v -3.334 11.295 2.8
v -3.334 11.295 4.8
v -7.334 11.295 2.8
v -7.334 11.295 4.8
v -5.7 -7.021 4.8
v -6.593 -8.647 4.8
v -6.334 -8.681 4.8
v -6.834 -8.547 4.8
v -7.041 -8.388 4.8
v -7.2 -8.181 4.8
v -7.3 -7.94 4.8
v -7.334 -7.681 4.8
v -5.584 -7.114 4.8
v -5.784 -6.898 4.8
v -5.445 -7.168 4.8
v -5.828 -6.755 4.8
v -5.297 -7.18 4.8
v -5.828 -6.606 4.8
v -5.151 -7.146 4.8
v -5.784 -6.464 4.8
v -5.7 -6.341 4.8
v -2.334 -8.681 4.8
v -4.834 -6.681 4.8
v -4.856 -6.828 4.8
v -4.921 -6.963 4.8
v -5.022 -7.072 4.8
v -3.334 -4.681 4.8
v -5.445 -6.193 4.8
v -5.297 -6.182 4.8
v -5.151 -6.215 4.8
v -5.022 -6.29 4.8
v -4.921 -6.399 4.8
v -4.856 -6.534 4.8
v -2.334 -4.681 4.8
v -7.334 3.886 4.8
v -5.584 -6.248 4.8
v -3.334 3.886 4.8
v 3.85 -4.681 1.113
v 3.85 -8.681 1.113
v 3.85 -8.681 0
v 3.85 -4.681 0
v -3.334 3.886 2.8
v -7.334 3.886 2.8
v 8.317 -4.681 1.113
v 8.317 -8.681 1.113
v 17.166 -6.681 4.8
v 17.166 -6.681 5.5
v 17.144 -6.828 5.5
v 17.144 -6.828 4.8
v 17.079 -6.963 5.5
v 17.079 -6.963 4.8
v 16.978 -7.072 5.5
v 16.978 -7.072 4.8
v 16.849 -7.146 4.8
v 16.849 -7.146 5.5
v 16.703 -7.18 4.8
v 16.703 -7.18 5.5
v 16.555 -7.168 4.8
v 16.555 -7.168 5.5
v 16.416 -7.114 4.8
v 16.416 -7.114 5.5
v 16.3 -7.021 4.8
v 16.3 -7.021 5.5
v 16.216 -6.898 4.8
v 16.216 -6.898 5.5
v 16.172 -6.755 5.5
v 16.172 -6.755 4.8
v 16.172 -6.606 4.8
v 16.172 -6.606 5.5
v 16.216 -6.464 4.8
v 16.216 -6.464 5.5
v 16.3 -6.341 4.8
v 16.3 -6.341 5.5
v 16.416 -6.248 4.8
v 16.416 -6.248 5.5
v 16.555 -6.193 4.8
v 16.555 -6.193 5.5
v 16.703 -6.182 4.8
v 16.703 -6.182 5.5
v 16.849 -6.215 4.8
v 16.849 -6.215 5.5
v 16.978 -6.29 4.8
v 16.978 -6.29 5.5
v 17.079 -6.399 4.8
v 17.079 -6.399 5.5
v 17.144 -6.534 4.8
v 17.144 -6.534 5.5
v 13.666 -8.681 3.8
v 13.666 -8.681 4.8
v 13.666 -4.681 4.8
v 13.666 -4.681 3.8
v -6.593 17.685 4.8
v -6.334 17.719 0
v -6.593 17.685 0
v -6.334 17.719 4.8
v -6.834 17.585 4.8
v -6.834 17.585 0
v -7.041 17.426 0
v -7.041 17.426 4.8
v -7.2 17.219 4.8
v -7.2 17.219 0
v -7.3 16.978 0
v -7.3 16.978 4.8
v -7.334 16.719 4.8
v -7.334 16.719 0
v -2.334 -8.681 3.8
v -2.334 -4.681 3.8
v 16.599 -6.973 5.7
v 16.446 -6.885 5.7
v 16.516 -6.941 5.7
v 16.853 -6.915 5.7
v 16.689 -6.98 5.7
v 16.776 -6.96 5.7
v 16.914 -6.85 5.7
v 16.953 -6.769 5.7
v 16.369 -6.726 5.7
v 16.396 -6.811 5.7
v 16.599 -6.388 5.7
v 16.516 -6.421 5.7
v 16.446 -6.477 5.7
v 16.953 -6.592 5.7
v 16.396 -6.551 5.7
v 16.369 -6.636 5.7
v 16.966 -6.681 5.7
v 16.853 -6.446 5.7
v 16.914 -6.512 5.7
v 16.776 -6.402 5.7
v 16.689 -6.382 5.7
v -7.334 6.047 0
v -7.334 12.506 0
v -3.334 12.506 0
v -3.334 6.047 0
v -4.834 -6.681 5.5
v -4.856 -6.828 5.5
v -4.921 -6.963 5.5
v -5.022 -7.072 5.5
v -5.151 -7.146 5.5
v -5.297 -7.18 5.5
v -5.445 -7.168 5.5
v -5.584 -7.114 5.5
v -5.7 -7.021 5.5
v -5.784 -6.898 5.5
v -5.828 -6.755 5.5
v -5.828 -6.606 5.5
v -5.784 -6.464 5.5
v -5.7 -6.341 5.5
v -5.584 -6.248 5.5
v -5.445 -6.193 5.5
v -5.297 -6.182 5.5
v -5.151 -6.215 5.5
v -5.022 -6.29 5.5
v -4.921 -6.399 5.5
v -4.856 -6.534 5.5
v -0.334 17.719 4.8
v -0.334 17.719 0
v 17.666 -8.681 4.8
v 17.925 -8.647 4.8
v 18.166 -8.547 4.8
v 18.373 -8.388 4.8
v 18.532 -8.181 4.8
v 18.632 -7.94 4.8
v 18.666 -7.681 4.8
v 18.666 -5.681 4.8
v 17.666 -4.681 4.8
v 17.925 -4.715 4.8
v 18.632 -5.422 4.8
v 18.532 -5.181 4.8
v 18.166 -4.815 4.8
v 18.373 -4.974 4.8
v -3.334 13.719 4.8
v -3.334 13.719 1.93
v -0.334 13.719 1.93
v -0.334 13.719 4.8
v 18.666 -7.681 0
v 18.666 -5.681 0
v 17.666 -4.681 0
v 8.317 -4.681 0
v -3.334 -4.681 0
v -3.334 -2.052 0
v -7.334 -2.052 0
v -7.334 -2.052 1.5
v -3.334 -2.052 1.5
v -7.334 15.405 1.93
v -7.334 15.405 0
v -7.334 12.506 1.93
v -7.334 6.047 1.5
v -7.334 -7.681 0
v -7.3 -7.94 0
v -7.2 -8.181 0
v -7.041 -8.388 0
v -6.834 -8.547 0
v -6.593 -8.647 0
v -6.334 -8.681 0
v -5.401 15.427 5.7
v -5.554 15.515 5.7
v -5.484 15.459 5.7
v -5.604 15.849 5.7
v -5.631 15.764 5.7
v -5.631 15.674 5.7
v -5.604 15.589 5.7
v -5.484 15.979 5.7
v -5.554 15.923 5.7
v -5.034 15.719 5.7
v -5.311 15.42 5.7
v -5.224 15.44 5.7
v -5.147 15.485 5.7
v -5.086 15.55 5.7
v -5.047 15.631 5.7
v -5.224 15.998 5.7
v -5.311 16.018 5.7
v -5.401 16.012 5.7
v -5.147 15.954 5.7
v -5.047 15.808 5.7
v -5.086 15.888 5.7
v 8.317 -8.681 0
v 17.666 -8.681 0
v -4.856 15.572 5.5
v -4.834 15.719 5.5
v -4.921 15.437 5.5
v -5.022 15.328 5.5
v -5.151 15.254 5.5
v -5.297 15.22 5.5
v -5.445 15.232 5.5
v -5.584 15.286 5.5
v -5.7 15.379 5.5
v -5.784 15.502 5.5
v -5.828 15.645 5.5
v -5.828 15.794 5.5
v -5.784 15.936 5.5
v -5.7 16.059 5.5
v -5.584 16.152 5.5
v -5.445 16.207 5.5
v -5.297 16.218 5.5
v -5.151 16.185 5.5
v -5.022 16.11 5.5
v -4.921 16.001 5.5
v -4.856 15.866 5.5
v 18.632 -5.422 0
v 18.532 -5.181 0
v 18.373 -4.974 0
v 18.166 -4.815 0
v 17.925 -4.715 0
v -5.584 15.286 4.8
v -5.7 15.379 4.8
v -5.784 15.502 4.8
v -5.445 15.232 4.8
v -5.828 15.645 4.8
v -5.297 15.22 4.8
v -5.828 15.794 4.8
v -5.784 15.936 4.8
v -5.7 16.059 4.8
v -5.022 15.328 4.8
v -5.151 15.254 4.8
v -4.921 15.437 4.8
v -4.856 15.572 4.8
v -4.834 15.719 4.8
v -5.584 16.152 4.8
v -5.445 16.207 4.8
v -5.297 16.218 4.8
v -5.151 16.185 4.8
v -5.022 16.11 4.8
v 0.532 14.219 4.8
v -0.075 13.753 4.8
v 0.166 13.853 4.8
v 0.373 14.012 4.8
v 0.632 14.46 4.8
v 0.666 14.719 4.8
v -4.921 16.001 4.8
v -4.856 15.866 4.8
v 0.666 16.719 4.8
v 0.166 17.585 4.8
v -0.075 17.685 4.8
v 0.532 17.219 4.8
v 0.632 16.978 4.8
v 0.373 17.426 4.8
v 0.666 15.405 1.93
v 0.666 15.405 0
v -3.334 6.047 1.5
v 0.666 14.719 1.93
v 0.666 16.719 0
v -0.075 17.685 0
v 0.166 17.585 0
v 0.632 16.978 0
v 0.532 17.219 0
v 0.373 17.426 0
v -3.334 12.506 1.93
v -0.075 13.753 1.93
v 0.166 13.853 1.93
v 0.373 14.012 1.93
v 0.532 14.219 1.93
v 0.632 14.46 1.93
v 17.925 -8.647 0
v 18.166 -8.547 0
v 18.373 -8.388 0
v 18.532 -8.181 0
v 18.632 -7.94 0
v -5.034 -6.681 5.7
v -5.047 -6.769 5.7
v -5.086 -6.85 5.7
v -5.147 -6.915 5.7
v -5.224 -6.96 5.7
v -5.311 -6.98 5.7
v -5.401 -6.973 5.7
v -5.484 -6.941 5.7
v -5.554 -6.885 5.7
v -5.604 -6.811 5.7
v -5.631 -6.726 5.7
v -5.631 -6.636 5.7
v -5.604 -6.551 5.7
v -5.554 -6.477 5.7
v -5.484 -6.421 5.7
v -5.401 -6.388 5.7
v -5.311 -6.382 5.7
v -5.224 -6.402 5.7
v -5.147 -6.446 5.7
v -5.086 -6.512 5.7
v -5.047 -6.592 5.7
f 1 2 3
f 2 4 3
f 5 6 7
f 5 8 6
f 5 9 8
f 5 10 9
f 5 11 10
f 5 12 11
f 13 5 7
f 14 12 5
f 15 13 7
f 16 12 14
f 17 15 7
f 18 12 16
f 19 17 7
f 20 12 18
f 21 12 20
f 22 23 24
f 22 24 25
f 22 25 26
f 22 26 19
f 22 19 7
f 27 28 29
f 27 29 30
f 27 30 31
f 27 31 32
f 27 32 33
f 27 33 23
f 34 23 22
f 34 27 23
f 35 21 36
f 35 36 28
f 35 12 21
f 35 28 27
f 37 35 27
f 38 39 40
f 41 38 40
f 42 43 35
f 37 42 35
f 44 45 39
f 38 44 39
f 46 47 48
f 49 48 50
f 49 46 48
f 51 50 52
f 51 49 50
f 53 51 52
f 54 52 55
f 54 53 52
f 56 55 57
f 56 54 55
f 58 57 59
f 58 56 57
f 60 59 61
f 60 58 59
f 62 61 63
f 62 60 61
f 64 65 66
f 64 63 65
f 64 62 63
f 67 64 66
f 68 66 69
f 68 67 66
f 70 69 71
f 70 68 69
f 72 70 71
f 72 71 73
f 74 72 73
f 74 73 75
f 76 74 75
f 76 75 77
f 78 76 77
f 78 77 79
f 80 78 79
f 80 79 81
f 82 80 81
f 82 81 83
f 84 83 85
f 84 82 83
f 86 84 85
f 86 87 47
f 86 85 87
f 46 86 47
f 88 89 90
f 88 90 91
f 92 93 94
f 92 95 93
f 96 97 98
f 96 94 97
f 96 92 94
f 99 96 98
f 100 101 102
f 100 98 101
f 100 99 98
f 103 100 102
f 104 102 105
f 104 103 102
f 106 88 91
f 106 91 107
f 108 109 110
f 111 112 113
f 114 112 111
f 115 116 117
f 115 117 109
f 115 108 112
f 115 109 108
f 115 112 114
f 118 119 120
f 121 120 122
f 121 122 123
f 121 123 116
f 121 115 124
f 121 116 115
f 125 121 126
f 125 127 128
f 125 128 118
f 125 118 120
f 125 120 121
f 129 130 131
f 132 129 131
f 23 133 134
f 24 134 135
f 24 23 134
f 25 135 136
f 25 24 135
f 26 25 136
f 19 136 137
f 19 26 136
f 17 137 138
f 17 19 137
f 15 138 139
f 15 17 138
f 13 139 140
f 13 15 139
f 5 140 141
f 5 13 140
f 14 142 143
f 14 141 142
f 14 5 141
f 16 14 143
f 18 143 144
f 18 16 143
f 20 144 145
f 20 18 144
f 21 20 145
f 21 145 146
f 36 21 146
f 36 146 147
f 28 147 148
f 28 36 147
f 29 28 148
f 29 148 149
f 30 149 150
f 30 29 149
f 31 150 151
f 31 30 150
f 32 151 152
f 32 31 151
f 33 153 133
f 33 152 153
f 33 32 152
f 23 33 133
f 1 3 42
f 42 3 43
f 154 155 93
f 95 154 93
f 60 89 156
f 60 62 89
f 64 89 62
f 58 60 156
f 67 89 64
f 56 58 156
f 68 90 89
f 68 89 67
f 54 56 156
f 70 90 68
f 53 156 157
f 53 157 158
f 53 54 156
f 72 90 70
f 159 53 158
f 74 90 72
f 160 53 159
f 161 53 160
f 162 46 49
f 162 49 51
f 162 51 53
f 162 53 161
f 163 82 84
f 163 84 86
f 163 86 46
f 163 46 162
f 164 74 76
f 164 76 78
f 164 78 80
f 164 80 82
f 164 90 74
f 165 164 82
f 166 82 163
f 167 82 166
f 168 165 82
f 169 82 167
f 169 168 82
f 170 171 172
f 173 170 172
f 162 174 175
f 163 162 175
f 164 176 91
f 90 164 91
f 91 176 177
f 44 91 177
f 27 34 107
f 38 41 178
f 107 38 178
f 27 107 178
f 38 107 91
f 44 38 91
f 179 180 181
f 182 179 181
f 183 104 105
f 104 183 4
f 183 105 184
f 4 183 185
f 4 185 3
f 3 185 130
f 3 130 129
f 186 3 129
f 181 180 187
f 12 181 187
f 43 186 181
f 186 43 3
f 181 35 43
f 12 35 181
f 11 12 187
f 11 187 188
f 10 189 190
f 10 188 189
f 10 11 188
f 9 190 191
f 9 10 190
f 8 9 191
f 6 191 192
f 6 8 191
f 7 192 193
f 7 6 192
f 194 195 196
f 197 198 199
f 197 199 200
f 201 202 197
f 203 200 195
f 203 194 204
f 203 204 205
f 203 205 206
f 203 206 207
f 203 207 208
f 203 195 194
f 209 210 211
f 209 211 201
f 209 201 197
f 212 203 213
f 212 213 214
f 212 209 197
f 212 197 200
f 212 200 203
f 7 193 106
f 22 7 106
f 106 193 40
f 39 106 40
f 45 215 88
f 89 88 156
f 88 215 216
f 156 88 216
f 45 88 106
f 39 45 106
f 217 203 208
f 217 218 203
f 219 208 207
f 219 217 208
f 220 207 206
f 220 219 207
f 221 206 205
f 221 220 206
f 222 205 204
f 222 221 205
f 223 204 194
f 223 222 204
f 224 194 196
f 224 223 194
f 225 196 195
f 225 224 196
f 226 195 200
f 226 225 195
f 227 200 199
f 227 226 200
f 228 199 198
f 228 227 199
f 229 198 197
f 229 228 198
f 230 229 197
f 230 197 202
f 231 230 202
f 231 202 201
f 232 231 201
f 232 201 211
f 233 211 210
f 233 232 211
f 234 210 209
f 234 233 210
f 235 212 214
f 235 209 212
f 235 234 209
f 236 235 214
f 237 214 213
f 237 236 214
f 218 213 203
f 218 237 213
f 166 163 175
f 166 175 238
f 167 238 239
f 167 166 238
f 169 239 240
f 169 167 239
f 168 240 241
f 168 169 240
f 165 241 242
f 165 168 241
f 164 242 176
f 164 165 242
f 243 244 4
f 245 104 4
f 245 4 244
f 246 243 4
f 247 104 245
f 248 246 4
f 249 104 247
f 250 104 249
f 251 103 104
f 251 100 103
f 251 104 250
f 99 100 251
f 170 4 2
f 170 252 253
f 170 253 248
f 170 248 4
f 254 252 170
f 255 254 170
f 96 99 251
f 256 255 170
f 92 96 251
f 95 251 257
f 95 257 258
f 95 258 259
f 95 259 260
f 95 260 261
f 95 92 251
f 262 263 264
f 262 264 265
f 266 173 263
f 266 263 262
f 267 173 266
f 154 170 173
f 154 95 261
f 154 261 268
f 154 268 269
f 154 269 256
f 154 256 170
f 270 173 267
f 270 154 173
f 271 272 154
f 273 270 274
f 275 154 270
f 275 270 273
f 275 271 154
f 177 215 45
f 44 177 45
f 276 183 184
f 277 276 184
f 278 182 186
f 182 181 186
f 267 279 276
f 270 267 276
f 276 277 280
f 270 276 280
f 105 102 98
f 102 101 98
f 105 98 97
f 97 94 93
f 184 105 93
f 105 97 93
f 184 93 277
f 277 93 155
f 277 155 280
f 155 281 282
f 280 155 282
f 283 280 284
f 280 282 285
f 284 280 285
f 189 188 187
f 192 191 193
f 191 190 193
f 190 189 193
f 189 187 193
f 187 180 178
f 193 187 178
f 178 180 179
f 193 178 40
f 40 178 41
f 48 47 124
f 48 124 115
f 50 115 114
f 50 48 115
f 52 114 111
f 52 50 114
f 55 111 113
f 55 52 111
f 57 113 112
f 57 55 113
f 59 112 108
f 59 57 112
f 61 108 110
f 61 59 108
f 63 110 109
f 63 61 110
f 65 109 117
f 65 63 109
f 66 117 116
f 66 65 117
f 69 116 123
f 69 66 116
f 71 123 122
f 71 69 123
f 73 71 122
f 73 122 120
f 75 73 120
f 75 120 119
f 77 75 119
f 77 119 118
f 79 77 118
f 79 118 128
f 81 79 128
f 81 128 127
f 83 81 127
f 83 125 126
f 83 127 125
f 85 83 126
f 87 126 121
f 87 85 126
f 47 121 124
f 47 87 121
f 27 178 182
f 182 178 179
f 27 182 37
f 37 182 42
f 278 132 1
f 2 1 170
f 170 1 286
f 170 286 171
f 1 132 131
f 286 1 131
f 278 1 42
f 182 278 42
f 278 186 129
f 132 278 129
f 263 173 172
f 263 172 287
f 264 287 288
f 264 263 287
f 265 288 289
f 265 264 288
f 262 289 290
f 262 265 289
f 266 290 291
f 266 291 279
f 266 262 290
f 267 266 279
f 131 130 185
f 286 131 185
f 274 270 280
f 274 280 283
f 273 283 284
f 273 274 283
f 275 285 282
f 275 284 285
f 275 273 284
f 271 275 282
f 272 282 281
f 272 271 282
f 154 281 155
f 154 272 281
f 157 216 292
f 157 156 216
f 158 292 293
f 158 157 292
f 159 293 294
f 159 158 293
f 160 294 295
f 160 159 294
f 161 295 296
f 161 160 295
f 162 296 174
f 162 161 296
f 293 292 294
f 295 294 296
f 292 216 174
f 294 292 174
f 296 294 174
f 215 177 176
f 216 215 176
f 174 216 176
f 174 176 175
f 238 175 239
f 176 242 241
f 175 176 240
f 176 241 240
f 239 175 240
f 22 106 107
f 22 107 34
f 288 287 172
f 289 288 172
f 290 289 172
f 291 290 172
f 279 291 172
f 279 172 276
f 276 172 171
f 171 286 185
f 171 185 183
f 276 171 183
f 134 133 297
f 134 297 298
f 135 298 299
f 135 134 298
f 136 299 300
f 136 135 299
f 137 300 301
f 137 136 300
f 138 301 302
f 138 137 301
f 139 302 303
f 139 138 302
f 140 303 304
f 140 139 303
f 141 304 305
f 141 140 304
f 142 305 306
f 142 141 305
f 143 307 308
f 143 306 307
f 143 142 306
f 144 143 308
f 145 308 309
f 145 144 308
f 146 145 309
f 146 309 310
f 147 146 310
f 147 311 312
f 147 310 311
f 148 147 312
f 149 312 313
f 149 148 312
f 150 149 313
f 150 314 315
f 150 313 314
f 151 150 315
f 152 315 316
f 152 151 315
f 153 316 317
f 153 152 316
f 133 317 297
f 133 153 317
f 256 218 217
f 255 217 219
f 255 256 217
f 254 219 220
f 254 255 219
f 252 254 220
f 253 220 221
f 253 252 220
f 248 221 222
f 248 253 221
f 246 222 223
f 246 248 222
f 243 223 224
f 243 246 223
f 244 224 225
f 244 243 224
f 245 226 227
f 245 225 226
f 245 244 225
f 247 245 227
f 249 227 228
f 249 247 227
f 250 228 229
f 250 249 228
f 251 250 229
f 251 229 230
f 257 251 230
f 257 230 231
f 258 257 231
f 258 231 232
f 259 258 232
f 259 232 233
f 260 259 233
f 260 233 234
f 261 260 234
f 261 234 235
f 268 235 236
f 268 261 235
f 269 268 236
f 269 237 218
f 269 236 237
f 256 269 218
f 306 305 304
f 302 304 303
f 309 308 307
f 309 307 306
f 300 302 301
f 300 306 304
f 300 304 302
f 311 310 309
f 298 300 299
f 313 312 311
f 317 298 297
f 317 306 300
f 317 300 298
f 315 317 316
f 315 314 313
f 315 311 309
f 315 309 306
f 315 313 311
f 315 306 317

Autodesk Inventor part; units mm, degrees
ref_plane "YZ Plane" through (0, 0, 0) normal (1, 0, 0) x (0, 1, 0)
ref_plane "XZ Plane" through (0, 0, 0) normal (0, 1, 0) x (-1, 0, 0)
ref_plane "XY Plane" through (0, 0, 0) normal (0, 0, 1) x (1, 0, 0)
sketch "Skizze1" plane through (0, 0, 0) normal (0, 0, 1) x (1, 0, 0)
  line L0 (0.6661, 17.7191) -> (-7.3339, 17.7191)
  line L1 (-7.3339, 17.7191) -> (-7.3339, -8.6809)
  line L2 (-7.3339, -8.6809) -> (18.6661, -8.6809)
  line L3 (18.6661, -8.6809) -> (18.6661, -4.6809)
  line L4 (18.6661, -4.6809) -> (-3.3339, -4.6809)
  line L5 (-3.3339, -4.6809) -> (-3.3339, 13.7191)
  line L6 (-3.3339, 13.7191) -> (0.6661, 13.7191)
  line L7 (0.6661, 13.7191) -> (0.6661, 17.7191)
  circle A0 centre (-5.3339, 15.7191) radius 0.5
  circle A1 centre (-5.3339, -6.6809) radius 0.5
  circle A2 centre (16.6661, -6.6809) radius 0.5
  point P0 (0, 0)
  point P1 (18.6661, -6.6809)
  point P2 (-1.3339, 13.7191)
  dimension "d0" = 26
  dimension "d1" = 26.4
  dimension "d2" = 4
  dimension "d3" = 4
  dimension "d4" = 4
  dimension "d5" = 4
  dimension "d6" = 1
  dimension "d7" = 1
  dimension "d8" = 1
  dimension "d9" = 2
  dimension "d10" = 2
  dimension "d11" = 2
  dimension "d12" = 2
  dimension "d13" = 2
  dimension "d14" = 2
extrude "Extrusion1" add sketch "Skizze1" along normal blind 4.8 contours L7 L6 L5 L4 L3 L2 L1 L0 | A0 | A1 | A2
extrude "Extrusion2" add sketch "Skizze1" along normal blind 5.7 contours A0 | A1 | A2
chamfer "Fase1" distance 0.2 angle 45 1 edges at (-5.8339, 15.7191, 5.7)
chamfer "Fase2" distance 0.2 angle 45 2 edges at (-5.8339, -6.6809, 5.7) (16.1661, -6.6809, 5.7)
sketch "Skizze2" plane through (-7.3339, -8.6809, 0) normal (0, -1, 0) x (1, 0, 0)
  line L0 (5, 5.5045) -> (21, 5.5045)
  line L1 (21, 5.5045) -> (21, 3.8)
  line L2 (21, 3.8) -> (5, 3.8)
  line L3 (5, 3.8) -> (5, 5.5045)
  line L4 (0, 0) -> (0, 4.8) projected
  line L5 (26, 0) -> (26, 4.8) projected
  line L6 (0, 4.8) -> (26, 4.8) projected
  line L7 (11.1841, -1.1388) -> (15.6513, -1.1388)
  line L8 (15.6513, -1.1388) -> (15.6513, 1.113)
  line L9 (15.6513, 1.113) -> (11.1841, 1.113)
  line L10 (11.1841, 1.113) -> (11.1841, -1.1388)
  point P0 (7.3339, 0)
  point P1 (21, 4.6522)
  dimension "d25" = 16
  dimension "d26" = 26
  dimension "d27" = 5
  dimension "d28" = 1
extrude "Extrusion3" cut sketch "Skizze2" against normal blind 5.7
sketch "Skizze3" plane through (-7.3339, -8.6809, 0) normal (-1, 0, 0) x (0, 0, 1)
  line L0 (6.3376, 19.9761) -> (2.8, 19.9761)
  line L1 (2.8, 19.9761) -> (2.8, 12.567)
  line L2 (2.8, 12.567) -> (6.3376, 12.567)
  line L3 (6.3376, 12.567) -> (6.3376, 19.9761)
  line L4 (-2.0066, 6.6289) -> (1.5, 6.6289)
  line L5 (1.5, 6.6289) -> (1.5, 14.728)
  line L6 (1.5, 14.728) -> (-2.0066, 14.728)
  line L7 (-2.0066, 14.728) -> (-2.0066, 6.6289)
  line L8 (4.8, 26.4) -> (4.8, 0) projected
  line L9 (0, 26.4) -> (0, 0) projected
  point P0 (0, 8.6809)
  dimension "d33" = 2
  dimension "d34" = 1.5
extrude "Extrusion4" cut sketch "Skizze3" against normal blind 5.7
fillet "Rundung1" radius 1 1 edges at (18.6661, -8.6809, 2.4)
fillet "Rundung2" radius 1 5 edges at (0.6661, 13.7191, 2.4) (18.6661, -4.6809, 2.4) (0.6661, 17.7191, 2.4) (-7.3339, -8.6809, 2.4) (-7.3339, 17.7191, 2.4)
sketch "Skizze4" plane through (-7.3339, -2.052, 1.5) normal (-1, 0, 0) x (0, 0, 1)
  line L0 (-1.5, 8.0991) -> (-1.5, 15.7711) projected
  line L1 (-1.5, 14.5578) -> (0.4295, 14.5578)
  line L2 (0.4295, 14.5578) -> (0.4295, 17.4567)
  line L3 (0.4295, 17.4567) -> (-1.5, 17.4567)
  line L4 (-1.5, 17.4567) -> (-1.5, 14.5578)
  point P0 (-1.5, 2.052)
  point P1 (-1.5, 15.7711)
extrude "Extrusion5" cut sketch "Skizze4" against normal blind 10
equation "\"d3\" = d2"
equation "\"d4\" = d3"
equation "\"d5\" = d4"
equation "\"d7\" = d6"
equation "\"d8\" = d6"
equation "\"d9\" = 0.5 * d4"
equation "\"d10\" = d9"
equation "\"d11\" = d10"
equation "\"d12\" = d10"
equation "\"d13\" = d11"
equation "\"d14\" = d13"
equation "\"d27\" = -0.5 * d25 + 0.5 * d26"
properties part number "DisplayUnterlage"
